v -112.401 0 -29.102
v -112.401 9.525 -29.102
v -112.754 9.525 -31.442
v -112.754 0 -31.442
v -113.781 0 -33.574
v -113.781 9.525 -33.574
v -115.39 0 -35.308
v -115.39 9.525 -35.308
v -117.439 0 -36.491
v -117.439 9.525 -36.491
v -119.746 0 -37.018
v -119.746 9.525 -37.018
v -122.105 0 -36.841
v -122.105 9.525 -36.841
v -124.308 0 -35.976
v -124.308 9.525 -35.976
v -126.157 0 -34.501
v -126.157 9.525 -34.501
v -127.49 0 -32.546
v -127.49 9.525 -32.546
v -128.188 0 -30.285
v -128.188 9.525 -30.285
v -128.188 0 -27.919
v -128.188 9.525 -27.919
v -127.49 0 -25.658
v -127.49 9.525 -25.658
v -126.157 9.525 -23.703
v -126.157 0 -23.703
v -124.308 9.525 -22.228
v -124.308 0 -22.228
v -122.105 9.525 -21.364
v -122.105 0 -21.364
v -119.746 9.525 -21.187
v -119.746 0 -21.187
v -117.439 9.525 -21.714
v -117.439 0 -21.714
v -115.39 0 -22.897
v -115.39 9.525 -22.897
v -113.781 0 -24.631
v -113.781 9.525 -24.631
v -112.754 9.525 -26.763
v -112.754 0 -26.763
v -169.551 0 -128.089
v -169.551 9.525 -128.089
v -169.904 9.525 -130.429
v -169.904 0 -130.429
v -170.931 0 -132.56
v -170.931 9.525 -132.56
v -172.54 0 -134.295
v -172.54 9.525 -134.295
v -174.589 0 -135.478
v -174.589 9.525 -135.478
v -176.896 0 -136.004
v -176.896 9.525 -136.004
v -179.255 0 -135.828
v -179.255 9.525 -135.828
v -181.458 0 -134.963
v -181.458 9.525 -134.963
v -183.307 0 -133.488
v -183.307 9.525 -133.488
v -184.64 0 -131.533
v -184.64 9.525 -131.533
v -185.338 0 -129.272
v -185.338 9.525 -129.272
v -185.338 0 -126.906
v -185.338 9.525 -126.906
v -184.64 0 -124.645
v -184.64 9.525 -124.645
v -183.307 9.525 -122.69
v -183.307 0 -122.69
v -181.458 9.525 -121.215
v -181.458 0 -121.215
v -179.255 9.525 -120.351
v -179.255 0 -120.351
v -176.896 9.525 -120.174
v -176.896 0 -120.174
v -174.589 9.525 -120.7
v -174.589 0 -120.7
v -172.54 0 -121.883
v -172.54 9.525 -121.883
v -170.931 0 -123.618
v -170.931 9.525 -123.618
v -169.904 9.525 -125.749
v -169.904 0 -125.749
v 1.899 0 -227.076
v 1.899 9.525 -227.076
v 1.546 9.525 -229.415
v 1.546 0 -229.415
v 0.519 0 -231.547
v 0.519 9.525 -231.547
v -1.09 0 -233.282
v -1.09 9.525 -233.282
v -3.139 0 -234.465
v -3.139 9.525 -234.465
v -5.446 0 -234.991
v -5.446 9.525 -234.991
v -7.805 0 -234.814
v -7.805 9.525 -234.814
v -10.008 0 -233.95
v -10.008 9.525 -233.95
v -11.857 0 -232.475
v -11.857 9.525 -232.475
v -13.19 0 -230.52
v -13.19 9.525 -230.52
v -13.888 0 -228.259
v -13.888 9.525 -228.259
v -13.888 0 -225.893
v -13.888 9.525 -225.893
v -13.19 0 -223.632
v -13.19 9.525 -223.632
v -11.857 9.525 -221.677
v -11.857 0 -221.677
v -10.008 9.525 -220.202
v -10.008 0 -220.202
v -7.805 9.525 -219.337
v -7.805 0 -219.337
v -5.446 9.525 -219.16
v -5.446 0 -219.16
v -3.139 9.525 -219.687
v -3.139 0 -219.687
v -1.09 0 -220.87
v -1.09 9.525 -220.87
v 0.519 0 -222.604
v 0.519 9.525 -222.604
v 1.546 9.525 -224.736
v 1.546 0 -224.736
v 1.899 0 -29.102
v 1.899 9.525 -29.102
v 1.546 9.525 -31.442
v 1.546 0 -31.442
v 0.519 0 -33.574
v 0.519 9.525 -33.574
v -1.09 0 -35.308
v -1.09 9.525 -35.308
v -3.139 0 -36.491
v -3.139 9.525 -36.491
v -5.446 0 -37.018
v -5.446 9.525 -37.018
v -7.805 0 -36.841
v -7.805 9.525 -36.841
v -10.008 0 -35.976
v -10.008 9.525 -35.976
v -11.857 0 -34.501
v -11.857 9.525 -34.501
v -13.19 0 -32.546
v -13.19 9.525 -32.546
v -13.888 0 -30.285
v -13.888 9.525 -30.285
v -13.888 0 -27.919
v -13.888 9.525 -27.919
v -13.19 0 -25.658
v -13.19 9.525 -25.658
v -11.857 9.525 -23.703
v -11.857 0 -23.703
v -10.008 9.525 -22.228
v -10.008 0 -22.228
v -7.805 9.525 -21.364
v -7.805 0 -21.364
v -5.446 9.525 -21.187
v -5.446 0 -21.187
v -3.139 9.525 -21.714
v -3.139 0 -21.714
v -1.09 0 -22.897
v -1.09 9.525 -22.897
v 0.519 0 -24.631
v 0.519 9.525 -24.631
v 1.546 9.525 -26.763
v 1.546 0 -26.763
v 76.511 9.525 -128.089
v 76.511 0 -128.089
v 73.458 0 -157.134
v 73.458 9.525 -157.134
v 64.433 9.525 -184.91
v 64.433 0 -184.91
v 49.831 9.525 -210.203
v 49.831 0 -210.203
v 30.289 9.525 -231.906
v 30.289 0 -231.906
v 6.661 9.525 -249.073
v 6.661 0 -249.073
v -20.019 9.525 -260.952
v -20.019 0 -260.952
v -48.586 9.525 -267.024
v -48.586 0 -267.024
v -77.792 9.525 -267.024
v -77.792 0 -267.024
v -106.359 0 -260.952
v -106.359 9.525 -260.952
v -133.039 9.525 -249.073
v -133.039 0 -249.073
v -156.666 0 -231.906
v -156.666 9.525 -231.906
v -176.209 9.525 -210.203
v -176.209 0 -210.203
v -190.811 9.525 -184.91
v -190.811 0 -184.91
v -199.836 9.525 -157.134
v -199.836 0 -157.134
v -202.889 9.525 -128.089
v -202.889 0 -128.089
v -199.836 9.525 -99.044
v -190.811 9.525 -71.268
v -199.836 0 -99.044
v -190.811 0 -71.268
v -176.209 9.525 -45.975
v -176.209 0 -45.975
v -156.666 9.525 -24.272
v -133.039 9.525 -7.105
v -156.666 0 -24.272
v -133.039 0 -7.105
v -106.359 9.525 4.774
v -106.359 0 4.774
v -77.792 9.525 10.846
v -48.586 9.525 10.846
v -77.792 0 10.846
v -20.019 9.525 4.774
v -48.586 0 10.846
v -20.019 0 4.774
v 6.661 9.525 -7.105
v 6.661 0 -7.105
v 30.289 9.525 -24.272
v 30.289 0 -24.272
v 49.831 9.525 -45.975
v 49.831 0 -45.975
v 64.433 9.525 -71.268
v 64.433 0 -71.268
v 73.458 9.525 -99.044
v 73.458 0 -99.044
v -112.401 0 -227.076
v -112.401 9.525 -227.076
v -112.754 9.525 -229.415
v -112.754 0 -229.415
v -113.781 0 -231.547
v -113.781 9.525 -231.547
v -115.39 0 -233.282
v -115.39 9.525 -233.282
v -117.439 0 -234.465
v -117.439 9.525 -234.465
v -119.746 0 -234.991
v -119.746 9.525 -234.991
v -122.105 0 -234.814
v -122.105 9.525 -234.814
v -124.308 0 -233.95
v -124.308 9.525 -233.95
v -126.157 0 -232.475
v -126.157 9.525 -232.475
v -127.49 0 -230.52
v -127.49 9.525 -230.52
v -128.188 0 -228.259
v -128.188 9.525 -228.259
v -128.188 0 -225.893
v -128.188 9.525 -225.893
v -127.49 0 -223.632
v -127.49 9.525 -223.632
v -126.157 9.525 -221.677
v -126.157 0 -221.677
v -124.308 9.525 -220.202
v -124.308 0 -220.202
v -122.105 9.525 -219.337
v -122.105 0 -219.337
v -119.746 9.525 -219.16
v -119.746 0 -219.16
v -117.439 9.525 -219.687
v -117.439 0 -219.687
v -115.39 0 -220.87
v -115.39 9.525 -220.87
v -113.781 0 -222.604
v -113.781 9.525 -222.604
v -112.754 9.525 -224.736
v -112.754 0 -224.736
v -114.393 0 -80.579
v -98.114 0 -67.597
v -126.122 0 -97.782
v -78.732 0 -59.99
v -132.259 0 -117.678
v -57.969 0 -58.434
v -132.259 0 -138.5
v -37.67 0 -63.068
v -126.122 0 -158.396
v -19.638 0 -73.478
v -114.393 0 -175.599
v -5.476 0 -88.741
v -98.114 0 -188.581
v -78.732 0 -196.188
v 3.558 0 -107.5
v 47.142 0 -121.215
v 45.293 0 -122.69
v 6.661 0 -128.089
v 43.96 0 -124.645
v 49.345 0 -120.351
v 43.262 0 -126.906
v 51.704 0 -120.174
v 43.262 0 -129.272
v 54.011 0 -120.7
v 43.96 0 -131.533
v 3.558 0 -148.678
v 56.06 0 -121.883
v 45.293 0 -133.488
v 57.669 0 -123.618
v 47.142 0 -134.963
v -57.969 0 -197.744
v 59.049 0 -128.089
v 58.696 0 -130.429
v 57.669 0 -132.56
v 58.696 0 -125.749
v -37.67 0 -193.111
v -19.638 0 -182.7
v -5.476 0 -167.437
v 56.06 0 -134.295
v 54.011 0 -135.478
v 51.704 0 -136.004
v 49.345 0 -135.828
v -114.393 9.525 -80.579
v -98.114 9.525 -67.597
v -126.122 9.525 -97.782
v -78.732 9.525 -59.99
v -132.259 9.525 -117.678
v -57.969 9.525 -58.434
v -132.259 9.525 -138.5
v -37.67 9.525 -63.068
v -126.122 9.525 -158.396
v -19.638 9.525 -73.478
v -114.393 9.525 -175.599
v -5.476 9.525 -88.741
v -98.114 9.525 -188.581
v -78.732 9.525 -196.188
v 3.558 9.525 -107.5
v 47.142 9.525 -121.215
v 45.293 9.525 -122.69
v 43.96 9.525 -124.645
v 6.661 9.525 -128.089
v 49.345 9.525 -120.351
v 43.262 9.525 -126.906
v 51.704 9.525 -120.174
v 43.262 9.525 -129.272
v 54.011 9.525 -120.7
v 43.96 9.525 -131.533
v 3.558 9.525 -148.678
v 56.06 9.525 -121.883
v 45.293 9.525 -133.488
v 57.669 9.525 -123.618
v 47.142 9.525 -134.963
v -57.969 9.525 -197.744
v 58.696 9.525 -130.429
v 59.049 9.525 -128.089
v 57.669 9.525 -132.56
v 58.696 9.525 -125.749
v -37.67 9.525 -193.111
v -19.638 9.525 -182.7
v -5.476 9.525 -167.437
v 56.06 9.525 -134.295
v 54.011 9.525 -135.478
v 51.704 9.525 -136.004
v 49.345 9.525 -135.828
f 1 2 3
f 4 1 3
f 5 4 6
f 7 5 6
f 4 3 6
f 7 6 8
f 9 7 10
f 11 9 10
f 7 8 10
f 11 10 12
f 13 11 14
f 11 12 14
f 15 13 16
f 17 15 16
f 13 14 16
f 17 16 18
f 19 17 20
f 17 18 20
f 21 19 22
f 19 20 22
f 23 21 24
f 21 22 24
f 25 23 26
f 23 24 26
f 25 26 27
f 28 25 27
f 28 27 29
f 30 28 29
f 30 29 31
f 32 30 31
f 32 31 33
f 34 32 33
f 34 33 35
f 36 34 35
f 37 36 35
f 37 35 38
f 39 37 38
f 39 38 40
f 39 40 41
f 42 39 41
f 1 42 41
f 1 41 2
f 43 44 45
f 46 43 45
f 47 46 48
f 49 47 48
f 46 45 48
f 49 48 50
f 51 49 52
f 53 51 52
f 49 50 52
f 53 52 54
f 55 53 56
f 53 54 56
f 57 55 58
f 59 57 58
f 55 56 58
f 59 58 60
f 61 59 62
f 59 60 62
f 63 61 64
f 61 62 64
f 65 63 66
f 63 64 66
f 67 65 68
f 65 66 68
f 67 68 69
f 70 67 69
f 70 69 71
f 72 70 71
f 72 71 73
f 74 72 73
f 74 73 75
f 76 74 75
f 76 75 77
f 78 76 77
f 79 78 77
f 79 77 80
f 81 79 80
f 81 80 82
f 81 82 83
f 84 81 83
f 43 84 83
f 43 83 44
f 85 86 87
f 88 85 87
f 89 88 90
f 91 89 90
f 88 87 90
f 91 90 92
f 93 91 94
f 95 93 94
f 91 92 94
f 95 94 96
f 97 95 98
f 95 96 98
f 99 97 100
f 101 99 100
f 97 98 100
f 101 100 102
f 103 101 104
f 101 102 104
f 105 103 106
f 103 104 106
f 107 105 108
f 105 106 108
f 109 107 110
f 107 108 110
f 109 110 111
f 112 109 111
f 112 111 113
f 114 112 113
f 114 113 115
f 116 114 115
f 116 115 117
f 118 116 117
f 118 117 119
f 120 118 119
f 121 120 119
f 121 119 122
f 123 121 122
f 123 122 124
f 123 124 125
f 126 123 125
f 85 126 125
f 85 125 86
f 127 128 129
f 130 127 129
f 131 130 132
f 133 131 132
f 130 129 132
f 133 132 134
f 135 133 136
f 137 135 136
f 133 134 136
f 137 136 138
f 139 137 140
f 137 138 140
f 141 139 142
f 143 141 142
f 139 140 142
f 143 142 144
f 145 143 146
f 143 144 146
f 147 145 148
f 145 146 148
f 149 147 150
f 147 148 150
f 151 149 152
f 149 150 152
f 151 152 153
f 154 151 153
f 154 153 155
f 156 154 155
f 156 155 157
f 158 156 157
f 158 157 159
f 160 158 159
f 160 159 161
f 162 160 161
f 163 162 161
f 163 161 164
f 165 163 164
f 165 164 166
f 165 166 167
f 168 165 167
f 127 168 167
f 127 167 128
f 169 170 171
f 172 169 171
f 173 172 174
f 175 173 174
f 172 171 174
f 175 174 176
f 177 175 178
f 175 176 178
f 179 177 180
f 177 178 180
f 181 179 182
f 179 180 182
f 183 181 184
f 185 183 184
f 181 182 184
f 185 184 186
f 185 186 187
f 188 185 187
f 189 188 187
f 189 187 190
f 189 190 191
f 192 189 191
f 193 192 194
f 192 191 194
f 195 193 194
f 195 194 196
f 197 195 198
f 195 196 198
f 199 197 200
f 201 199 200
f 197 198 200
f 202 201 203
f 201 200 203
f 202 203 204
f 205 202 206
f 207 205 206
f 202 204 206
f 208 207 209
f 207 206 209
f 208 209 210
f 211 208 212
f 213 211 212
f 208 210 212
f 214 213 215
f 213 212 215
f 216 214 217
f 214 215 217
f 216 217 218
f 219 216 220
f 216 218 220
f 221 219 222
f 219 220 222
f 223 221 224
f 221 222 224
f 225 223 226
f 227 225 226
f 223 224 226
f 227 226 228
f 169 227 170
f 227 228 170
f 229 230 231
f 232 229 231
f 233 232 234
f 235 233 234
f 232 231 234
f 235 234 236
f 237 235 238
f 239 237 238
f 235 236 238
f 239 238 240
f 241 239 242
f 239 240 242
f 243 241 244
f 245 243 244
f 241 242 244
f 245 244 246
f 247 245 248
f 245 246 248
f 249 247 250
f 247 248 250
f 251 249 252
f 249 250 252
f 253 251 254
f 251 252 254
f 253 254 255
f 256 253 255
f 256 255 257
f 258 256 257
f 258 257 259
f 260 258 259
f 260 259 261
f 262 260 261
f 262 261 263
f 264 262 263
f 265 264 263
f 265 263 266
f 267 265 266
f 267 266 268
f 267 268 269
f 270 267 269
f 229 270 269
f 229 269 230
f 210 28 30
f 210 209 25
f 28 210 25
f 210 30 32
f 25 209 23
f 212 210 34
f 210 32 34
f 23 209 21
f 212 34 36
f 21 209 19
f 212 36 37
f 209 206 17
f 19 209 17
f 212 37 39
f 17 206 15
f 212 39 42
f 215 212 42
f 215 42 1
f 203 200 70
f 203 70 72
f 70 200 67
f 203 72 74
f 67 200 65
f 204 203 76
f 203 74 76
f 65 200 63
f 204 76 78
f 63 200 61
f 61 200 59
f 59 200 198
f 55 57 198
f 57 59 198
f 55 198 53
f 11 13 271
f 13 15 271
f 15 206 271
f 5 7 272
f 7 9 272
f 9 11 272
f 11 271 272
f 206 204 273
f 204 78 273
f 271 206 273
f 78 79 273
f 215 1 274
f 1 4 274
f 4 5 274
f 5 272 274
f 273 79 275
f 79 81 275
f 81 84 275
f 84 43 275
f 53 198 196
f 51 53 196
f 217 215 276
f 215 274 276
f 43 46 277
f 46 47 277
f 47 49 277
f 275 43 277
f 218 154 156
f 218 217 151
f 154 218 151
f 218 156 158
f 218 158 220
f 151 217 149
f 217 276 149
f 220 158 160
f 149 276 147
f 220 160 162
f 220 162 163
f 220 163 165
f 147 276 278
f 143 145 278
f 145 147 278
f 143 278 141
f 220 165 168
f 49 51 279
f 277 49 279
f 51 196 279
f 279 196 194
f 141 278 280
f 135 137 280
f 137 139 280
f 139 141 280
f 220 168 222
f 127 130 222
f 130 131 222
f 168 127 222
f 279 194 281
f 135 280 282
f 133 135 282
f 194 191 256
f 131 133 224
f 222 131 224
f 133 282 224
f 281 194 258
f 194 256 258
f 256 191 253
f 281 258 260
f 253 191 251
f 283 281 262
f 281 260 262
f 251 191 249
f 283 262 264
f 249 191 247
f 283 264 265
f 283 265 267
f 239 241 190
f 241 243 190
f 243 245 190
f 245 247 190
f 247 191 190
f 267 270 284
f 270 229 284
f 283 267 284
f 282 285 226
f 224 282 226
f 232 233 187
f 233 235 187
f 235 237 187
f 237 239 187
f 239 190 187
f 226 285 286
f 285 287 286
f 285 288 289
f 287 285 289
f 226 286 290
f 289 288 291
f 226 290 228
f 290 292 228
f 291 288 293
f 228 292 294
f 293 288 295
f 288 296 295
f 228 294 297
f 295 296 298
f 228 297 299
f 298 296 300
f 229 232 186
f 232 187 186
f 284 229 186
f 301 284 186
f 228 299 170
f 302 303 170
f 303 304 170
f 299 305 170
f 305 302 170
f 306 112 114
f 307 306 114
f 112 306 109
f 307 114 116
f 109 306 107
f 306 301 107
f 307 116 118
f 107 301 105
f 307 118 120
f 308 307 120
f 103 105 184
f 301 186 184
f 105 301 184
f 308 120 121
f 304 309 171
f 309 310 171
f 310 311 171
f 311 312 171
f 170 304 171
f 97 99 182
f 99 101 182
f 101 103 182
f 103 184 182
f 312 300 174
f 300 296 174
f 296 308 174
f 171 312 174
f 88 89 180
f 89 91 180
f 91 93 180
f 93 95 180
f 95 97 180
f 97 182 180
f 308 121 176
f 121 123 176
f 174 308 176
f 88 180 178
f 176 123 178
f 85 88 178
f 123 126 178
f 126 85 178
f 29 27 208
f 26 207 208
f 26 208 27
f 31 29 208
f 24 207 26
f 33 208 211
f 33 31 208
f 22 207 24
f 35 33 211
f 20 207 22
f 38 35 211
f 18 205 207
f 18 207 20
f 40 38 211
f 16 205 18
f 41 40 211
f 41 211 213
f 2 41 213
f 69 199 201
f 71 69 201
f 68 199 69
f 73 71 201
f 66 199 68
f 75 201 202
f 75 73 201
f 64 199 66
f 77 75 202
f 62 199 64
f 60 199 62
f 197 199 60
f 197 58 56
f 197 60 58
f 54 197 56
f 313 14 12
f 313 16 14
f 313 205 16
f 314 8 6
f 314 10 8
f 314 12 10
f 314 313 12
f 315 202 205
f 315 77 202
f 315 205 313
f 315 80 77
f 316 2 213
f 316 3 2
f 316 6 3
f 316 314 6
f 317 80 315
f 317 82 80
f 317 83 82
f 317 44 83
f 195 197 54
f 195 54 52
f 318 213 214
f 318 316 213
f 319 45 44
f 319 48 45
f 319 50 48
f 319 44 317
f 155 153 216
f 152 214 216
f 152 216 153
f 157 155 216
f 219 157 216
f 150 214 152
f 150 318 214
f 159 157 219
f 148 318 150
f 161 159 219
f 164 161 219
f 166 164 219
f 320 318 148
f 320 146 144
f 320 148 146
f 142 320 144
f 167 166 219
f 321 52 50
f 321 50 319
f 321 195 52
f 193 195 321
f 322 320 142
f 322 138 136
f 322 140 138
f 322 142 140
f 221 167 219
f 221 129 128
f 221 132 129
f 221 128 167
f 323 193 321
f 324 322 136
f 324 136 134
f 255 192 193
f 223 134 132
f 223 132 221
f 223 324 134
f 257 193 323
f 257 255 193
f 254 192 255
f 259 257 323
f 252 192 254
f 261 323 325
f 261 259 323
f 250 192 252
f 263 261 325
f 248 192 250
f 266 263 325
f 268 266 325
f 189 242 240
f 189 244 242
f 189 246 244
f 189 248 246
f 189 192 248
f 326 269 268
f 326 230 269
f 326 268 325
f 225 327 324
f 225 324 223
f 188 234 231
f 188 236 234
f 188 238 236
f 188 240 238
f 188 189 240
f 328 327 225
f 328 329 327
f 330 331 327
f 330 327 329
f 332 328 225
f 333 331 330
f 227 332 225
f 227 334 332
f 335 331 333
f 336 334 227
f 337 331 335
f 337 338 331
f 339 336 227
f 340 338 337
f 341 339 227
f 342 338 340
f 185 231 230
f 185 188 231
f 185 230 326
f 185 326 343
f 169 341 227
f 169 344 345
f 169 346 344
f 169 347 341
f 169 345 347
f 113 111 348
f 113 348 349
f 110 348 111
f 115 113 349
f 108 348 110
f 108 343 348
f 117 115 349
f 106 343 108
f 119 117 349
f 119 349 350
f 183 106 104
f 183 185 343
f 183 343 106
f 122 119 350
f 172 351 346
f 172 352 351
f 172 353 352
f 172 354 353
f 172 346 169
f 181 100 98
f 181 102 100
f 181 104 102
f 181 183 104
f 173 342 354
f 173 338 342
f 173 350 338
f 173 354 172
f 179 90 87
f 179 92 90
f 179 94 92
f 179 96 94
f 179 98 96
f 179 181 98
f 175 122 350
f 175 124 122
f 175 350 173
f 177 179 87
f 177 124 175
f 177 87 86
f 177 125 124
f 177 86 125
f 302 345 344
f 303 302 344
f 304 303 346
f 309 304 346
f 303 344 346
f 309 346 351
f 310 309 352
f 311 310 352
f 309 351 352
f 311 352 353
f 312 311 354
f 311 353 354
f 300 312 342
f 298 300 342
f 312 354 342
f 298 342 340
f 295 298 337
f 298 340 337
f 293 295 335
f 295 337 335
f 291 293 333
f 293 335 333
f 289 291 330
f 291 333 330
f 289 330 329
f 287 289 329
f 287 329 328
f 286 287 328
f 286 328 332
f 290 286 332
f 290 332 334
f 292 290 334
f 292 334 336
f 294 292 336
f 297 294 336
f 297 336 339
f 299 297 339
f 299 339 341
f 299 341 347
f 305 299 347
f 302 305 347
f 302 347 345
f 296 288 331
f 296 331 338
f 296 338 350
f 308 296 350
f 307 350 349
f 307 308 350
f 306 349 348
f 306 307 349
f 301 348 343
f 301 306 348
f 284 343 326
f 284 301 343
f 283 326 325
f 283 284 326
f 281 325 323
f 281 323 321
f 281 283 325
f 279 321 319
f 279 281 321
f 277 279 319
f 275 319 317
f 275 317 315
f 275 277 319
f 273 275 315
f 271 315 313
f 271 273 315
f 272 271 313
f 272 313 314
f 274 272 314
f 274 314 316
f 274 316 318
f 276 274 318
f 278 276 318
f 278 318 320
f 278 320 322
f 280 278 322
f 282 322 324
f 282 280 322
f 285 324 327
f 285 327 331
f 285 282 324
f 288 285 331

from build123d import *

# Parameters (mm, degrees)
SKETCH1_R           = 139.7
SKETCH1_R_2         = 69.85
BOSS_EXTRUDE1_DEPTH = 9.525
CUT_EXTRUDE1_REACH  = 11.525
SKETCH2_R           = 7.9375


with BuildPart() as part:
    # Sketch1 → Boss-Extrude1 (new body)
    with BuildSketch(Plane(origin=(0, 0, 0), x_dir=(1, 0, 0), z_dir=(0, 1, 0))):
        with Locations((-63.18889636, 128.089070316)):
            Circle(SKETCH1_R)
        with Locations((-63.18889636, 128.089070316)):
            Circle(SKETCH1_R_2, mode=Mode.SUBTRACT)
    extrude(amount=BOSS_EXTRUDE1_DEPTH)

    # Sketch2 → Cut-Extrude1 (cut, up to next)
    with BuildSketch(Plane(origin=(0, 9.525, 0), x_dir=(1, 0, 0), z_dir=(0, 1, 0)), mode=Mode.PRIVATE) as cut_extrude1_sk1:
        with Locations((51.11110364, 128.089070316)):
            Circle(SKETCH2_R)
    cut_extrude1_tool1 = extrude(cut_extrude1_sk1.sketch, amount=-CUT_EXTRUDE1_REACH, mode=Mode.PRIVATE) & part.part
    add(cut_extrude1_tool1.solids().sort_by_distance((51.111104, 9.525, -128.08907))[0], mode=Mode.SUBTRACT)
    # Sketch2 → Cut-Extrude1 (cut, up to next)
    with BuildSketch(Plane(origin=(0, 9.525, 0), x_dir=(1, 0, 0), z_dir=(0, 1, 0)), mode=Mode.PRIVATE) as cut_extrude1_sk2:
        with Locations((-6.03889636, 227.075773969)):
            Circle(SKETCH2_R)
    cut_extrude1_tool2 = extrude(cut_extrude1_sk2.sketch, amount=-CUT_EXTRUDE1_REACH, mode=Mode.PRIVATE) & part.part
    add(cut_extrude1_tool2.solids().sort_by_distance((-6.038896, 9.525, -227.075774))[0], mode=Mode.SUBTRACT)
    # Sketch2 → Cut-Extrude1 (cut, up to next)
    with BuildSketch(Plane(origin=(0, 9.525, 0), x_dir=(1, 0, 0), z_dir=(0, 1, 0)), mode=Mode.PRIVATE) as cut_extrude1_sk3:
        with Locations((-120.33889636, 227.075773969)):
            Circle(SKETCH2_R)
    cut_extrude1_tool3 = extrude(cut_extrude1_sk3.sketch, amount=-CUT_EXTRUDE1_REACH, mode=Mode.PRIVATE) & part.part
    add(cut_extrude1_tool3.solids().sort_by_distance((-120.338896, 9.525, -227.075774))[0], mode=Mode.SUBTRACT)
    # Sketch2 → Cut-Extrude1 (cut, up to next)
    with BuildSketch(Plane(origin=(0, 9.525, 0), x_dir=(1, 0, 0), z_dir=(0, 1, 0)), mode=Mode.PRIVATE) as cut_extrude1_sk4:
        with Locations((-177.48889636, 128.089070316)):
            Circle(SKETCH2_R)
    cut_extrude1_tool4 = extrude(cut_extrude1_sk4.sketch, amount=-CUT_EXTRUDE1_REACH, mode=Mode.PRIVATE) & part.part
    add(cut_extrude1_tool4.solids().sort_by_distance((-177.488896, 9.525, -128.08907))[0], mode=Mode.SUBTRACT)
    # Sketch2 → Cut-Extrude1 (cut, up to next)
    with BuildSketch(Plane(origin=(0, 9.525, 0), x_dir=(1, 0, 0), z_dir=(0, 1, 0)), mode=Mode.PRIVATE) as cut_extrude1_sk5:
        with Locations((-120.33889636, 29.102366663)):
            Circle(SKETCH2_R)
    cut_extrude1_tool5 = extrude(cut_extrude1_sk5.sketch, amount=-CUT_EXTRUDE1_REACH, mode=Mode.PRIVATE) & part.part
    add(cut_extrude1_tool5.solids().sort_by_distance((-120.338896, 9.525, -29.102367))[0], mode=Mode.SUBTRACT)
    # Sketch2 → Cut-Extrude1 (cut, up to next)
    with BuildSketch(Plane(origin=(0, 9.525, 0), x_dir=(1, 0, 0), z_dir=(0, 1, 0)), mode=Mode.PRIVATE) as cut_extrude1_sk6:
        with Locations((-6.03889636, 29.102366663)):
            Circle(SKETCH2_R)
    cut_extrude1_tool6 = extrude(cut_extrude1_sk6.sketch, amount=-CUT_EXTRUDE1_REACH, mode=Mode.PRIVATE) & part.part
    add(cut_extrude1_tool6.solids().sort_by_distance((-6.038896, 9.525, -29.102367))[0], mode=Mode.SUBTRACT)


solid = part.part
